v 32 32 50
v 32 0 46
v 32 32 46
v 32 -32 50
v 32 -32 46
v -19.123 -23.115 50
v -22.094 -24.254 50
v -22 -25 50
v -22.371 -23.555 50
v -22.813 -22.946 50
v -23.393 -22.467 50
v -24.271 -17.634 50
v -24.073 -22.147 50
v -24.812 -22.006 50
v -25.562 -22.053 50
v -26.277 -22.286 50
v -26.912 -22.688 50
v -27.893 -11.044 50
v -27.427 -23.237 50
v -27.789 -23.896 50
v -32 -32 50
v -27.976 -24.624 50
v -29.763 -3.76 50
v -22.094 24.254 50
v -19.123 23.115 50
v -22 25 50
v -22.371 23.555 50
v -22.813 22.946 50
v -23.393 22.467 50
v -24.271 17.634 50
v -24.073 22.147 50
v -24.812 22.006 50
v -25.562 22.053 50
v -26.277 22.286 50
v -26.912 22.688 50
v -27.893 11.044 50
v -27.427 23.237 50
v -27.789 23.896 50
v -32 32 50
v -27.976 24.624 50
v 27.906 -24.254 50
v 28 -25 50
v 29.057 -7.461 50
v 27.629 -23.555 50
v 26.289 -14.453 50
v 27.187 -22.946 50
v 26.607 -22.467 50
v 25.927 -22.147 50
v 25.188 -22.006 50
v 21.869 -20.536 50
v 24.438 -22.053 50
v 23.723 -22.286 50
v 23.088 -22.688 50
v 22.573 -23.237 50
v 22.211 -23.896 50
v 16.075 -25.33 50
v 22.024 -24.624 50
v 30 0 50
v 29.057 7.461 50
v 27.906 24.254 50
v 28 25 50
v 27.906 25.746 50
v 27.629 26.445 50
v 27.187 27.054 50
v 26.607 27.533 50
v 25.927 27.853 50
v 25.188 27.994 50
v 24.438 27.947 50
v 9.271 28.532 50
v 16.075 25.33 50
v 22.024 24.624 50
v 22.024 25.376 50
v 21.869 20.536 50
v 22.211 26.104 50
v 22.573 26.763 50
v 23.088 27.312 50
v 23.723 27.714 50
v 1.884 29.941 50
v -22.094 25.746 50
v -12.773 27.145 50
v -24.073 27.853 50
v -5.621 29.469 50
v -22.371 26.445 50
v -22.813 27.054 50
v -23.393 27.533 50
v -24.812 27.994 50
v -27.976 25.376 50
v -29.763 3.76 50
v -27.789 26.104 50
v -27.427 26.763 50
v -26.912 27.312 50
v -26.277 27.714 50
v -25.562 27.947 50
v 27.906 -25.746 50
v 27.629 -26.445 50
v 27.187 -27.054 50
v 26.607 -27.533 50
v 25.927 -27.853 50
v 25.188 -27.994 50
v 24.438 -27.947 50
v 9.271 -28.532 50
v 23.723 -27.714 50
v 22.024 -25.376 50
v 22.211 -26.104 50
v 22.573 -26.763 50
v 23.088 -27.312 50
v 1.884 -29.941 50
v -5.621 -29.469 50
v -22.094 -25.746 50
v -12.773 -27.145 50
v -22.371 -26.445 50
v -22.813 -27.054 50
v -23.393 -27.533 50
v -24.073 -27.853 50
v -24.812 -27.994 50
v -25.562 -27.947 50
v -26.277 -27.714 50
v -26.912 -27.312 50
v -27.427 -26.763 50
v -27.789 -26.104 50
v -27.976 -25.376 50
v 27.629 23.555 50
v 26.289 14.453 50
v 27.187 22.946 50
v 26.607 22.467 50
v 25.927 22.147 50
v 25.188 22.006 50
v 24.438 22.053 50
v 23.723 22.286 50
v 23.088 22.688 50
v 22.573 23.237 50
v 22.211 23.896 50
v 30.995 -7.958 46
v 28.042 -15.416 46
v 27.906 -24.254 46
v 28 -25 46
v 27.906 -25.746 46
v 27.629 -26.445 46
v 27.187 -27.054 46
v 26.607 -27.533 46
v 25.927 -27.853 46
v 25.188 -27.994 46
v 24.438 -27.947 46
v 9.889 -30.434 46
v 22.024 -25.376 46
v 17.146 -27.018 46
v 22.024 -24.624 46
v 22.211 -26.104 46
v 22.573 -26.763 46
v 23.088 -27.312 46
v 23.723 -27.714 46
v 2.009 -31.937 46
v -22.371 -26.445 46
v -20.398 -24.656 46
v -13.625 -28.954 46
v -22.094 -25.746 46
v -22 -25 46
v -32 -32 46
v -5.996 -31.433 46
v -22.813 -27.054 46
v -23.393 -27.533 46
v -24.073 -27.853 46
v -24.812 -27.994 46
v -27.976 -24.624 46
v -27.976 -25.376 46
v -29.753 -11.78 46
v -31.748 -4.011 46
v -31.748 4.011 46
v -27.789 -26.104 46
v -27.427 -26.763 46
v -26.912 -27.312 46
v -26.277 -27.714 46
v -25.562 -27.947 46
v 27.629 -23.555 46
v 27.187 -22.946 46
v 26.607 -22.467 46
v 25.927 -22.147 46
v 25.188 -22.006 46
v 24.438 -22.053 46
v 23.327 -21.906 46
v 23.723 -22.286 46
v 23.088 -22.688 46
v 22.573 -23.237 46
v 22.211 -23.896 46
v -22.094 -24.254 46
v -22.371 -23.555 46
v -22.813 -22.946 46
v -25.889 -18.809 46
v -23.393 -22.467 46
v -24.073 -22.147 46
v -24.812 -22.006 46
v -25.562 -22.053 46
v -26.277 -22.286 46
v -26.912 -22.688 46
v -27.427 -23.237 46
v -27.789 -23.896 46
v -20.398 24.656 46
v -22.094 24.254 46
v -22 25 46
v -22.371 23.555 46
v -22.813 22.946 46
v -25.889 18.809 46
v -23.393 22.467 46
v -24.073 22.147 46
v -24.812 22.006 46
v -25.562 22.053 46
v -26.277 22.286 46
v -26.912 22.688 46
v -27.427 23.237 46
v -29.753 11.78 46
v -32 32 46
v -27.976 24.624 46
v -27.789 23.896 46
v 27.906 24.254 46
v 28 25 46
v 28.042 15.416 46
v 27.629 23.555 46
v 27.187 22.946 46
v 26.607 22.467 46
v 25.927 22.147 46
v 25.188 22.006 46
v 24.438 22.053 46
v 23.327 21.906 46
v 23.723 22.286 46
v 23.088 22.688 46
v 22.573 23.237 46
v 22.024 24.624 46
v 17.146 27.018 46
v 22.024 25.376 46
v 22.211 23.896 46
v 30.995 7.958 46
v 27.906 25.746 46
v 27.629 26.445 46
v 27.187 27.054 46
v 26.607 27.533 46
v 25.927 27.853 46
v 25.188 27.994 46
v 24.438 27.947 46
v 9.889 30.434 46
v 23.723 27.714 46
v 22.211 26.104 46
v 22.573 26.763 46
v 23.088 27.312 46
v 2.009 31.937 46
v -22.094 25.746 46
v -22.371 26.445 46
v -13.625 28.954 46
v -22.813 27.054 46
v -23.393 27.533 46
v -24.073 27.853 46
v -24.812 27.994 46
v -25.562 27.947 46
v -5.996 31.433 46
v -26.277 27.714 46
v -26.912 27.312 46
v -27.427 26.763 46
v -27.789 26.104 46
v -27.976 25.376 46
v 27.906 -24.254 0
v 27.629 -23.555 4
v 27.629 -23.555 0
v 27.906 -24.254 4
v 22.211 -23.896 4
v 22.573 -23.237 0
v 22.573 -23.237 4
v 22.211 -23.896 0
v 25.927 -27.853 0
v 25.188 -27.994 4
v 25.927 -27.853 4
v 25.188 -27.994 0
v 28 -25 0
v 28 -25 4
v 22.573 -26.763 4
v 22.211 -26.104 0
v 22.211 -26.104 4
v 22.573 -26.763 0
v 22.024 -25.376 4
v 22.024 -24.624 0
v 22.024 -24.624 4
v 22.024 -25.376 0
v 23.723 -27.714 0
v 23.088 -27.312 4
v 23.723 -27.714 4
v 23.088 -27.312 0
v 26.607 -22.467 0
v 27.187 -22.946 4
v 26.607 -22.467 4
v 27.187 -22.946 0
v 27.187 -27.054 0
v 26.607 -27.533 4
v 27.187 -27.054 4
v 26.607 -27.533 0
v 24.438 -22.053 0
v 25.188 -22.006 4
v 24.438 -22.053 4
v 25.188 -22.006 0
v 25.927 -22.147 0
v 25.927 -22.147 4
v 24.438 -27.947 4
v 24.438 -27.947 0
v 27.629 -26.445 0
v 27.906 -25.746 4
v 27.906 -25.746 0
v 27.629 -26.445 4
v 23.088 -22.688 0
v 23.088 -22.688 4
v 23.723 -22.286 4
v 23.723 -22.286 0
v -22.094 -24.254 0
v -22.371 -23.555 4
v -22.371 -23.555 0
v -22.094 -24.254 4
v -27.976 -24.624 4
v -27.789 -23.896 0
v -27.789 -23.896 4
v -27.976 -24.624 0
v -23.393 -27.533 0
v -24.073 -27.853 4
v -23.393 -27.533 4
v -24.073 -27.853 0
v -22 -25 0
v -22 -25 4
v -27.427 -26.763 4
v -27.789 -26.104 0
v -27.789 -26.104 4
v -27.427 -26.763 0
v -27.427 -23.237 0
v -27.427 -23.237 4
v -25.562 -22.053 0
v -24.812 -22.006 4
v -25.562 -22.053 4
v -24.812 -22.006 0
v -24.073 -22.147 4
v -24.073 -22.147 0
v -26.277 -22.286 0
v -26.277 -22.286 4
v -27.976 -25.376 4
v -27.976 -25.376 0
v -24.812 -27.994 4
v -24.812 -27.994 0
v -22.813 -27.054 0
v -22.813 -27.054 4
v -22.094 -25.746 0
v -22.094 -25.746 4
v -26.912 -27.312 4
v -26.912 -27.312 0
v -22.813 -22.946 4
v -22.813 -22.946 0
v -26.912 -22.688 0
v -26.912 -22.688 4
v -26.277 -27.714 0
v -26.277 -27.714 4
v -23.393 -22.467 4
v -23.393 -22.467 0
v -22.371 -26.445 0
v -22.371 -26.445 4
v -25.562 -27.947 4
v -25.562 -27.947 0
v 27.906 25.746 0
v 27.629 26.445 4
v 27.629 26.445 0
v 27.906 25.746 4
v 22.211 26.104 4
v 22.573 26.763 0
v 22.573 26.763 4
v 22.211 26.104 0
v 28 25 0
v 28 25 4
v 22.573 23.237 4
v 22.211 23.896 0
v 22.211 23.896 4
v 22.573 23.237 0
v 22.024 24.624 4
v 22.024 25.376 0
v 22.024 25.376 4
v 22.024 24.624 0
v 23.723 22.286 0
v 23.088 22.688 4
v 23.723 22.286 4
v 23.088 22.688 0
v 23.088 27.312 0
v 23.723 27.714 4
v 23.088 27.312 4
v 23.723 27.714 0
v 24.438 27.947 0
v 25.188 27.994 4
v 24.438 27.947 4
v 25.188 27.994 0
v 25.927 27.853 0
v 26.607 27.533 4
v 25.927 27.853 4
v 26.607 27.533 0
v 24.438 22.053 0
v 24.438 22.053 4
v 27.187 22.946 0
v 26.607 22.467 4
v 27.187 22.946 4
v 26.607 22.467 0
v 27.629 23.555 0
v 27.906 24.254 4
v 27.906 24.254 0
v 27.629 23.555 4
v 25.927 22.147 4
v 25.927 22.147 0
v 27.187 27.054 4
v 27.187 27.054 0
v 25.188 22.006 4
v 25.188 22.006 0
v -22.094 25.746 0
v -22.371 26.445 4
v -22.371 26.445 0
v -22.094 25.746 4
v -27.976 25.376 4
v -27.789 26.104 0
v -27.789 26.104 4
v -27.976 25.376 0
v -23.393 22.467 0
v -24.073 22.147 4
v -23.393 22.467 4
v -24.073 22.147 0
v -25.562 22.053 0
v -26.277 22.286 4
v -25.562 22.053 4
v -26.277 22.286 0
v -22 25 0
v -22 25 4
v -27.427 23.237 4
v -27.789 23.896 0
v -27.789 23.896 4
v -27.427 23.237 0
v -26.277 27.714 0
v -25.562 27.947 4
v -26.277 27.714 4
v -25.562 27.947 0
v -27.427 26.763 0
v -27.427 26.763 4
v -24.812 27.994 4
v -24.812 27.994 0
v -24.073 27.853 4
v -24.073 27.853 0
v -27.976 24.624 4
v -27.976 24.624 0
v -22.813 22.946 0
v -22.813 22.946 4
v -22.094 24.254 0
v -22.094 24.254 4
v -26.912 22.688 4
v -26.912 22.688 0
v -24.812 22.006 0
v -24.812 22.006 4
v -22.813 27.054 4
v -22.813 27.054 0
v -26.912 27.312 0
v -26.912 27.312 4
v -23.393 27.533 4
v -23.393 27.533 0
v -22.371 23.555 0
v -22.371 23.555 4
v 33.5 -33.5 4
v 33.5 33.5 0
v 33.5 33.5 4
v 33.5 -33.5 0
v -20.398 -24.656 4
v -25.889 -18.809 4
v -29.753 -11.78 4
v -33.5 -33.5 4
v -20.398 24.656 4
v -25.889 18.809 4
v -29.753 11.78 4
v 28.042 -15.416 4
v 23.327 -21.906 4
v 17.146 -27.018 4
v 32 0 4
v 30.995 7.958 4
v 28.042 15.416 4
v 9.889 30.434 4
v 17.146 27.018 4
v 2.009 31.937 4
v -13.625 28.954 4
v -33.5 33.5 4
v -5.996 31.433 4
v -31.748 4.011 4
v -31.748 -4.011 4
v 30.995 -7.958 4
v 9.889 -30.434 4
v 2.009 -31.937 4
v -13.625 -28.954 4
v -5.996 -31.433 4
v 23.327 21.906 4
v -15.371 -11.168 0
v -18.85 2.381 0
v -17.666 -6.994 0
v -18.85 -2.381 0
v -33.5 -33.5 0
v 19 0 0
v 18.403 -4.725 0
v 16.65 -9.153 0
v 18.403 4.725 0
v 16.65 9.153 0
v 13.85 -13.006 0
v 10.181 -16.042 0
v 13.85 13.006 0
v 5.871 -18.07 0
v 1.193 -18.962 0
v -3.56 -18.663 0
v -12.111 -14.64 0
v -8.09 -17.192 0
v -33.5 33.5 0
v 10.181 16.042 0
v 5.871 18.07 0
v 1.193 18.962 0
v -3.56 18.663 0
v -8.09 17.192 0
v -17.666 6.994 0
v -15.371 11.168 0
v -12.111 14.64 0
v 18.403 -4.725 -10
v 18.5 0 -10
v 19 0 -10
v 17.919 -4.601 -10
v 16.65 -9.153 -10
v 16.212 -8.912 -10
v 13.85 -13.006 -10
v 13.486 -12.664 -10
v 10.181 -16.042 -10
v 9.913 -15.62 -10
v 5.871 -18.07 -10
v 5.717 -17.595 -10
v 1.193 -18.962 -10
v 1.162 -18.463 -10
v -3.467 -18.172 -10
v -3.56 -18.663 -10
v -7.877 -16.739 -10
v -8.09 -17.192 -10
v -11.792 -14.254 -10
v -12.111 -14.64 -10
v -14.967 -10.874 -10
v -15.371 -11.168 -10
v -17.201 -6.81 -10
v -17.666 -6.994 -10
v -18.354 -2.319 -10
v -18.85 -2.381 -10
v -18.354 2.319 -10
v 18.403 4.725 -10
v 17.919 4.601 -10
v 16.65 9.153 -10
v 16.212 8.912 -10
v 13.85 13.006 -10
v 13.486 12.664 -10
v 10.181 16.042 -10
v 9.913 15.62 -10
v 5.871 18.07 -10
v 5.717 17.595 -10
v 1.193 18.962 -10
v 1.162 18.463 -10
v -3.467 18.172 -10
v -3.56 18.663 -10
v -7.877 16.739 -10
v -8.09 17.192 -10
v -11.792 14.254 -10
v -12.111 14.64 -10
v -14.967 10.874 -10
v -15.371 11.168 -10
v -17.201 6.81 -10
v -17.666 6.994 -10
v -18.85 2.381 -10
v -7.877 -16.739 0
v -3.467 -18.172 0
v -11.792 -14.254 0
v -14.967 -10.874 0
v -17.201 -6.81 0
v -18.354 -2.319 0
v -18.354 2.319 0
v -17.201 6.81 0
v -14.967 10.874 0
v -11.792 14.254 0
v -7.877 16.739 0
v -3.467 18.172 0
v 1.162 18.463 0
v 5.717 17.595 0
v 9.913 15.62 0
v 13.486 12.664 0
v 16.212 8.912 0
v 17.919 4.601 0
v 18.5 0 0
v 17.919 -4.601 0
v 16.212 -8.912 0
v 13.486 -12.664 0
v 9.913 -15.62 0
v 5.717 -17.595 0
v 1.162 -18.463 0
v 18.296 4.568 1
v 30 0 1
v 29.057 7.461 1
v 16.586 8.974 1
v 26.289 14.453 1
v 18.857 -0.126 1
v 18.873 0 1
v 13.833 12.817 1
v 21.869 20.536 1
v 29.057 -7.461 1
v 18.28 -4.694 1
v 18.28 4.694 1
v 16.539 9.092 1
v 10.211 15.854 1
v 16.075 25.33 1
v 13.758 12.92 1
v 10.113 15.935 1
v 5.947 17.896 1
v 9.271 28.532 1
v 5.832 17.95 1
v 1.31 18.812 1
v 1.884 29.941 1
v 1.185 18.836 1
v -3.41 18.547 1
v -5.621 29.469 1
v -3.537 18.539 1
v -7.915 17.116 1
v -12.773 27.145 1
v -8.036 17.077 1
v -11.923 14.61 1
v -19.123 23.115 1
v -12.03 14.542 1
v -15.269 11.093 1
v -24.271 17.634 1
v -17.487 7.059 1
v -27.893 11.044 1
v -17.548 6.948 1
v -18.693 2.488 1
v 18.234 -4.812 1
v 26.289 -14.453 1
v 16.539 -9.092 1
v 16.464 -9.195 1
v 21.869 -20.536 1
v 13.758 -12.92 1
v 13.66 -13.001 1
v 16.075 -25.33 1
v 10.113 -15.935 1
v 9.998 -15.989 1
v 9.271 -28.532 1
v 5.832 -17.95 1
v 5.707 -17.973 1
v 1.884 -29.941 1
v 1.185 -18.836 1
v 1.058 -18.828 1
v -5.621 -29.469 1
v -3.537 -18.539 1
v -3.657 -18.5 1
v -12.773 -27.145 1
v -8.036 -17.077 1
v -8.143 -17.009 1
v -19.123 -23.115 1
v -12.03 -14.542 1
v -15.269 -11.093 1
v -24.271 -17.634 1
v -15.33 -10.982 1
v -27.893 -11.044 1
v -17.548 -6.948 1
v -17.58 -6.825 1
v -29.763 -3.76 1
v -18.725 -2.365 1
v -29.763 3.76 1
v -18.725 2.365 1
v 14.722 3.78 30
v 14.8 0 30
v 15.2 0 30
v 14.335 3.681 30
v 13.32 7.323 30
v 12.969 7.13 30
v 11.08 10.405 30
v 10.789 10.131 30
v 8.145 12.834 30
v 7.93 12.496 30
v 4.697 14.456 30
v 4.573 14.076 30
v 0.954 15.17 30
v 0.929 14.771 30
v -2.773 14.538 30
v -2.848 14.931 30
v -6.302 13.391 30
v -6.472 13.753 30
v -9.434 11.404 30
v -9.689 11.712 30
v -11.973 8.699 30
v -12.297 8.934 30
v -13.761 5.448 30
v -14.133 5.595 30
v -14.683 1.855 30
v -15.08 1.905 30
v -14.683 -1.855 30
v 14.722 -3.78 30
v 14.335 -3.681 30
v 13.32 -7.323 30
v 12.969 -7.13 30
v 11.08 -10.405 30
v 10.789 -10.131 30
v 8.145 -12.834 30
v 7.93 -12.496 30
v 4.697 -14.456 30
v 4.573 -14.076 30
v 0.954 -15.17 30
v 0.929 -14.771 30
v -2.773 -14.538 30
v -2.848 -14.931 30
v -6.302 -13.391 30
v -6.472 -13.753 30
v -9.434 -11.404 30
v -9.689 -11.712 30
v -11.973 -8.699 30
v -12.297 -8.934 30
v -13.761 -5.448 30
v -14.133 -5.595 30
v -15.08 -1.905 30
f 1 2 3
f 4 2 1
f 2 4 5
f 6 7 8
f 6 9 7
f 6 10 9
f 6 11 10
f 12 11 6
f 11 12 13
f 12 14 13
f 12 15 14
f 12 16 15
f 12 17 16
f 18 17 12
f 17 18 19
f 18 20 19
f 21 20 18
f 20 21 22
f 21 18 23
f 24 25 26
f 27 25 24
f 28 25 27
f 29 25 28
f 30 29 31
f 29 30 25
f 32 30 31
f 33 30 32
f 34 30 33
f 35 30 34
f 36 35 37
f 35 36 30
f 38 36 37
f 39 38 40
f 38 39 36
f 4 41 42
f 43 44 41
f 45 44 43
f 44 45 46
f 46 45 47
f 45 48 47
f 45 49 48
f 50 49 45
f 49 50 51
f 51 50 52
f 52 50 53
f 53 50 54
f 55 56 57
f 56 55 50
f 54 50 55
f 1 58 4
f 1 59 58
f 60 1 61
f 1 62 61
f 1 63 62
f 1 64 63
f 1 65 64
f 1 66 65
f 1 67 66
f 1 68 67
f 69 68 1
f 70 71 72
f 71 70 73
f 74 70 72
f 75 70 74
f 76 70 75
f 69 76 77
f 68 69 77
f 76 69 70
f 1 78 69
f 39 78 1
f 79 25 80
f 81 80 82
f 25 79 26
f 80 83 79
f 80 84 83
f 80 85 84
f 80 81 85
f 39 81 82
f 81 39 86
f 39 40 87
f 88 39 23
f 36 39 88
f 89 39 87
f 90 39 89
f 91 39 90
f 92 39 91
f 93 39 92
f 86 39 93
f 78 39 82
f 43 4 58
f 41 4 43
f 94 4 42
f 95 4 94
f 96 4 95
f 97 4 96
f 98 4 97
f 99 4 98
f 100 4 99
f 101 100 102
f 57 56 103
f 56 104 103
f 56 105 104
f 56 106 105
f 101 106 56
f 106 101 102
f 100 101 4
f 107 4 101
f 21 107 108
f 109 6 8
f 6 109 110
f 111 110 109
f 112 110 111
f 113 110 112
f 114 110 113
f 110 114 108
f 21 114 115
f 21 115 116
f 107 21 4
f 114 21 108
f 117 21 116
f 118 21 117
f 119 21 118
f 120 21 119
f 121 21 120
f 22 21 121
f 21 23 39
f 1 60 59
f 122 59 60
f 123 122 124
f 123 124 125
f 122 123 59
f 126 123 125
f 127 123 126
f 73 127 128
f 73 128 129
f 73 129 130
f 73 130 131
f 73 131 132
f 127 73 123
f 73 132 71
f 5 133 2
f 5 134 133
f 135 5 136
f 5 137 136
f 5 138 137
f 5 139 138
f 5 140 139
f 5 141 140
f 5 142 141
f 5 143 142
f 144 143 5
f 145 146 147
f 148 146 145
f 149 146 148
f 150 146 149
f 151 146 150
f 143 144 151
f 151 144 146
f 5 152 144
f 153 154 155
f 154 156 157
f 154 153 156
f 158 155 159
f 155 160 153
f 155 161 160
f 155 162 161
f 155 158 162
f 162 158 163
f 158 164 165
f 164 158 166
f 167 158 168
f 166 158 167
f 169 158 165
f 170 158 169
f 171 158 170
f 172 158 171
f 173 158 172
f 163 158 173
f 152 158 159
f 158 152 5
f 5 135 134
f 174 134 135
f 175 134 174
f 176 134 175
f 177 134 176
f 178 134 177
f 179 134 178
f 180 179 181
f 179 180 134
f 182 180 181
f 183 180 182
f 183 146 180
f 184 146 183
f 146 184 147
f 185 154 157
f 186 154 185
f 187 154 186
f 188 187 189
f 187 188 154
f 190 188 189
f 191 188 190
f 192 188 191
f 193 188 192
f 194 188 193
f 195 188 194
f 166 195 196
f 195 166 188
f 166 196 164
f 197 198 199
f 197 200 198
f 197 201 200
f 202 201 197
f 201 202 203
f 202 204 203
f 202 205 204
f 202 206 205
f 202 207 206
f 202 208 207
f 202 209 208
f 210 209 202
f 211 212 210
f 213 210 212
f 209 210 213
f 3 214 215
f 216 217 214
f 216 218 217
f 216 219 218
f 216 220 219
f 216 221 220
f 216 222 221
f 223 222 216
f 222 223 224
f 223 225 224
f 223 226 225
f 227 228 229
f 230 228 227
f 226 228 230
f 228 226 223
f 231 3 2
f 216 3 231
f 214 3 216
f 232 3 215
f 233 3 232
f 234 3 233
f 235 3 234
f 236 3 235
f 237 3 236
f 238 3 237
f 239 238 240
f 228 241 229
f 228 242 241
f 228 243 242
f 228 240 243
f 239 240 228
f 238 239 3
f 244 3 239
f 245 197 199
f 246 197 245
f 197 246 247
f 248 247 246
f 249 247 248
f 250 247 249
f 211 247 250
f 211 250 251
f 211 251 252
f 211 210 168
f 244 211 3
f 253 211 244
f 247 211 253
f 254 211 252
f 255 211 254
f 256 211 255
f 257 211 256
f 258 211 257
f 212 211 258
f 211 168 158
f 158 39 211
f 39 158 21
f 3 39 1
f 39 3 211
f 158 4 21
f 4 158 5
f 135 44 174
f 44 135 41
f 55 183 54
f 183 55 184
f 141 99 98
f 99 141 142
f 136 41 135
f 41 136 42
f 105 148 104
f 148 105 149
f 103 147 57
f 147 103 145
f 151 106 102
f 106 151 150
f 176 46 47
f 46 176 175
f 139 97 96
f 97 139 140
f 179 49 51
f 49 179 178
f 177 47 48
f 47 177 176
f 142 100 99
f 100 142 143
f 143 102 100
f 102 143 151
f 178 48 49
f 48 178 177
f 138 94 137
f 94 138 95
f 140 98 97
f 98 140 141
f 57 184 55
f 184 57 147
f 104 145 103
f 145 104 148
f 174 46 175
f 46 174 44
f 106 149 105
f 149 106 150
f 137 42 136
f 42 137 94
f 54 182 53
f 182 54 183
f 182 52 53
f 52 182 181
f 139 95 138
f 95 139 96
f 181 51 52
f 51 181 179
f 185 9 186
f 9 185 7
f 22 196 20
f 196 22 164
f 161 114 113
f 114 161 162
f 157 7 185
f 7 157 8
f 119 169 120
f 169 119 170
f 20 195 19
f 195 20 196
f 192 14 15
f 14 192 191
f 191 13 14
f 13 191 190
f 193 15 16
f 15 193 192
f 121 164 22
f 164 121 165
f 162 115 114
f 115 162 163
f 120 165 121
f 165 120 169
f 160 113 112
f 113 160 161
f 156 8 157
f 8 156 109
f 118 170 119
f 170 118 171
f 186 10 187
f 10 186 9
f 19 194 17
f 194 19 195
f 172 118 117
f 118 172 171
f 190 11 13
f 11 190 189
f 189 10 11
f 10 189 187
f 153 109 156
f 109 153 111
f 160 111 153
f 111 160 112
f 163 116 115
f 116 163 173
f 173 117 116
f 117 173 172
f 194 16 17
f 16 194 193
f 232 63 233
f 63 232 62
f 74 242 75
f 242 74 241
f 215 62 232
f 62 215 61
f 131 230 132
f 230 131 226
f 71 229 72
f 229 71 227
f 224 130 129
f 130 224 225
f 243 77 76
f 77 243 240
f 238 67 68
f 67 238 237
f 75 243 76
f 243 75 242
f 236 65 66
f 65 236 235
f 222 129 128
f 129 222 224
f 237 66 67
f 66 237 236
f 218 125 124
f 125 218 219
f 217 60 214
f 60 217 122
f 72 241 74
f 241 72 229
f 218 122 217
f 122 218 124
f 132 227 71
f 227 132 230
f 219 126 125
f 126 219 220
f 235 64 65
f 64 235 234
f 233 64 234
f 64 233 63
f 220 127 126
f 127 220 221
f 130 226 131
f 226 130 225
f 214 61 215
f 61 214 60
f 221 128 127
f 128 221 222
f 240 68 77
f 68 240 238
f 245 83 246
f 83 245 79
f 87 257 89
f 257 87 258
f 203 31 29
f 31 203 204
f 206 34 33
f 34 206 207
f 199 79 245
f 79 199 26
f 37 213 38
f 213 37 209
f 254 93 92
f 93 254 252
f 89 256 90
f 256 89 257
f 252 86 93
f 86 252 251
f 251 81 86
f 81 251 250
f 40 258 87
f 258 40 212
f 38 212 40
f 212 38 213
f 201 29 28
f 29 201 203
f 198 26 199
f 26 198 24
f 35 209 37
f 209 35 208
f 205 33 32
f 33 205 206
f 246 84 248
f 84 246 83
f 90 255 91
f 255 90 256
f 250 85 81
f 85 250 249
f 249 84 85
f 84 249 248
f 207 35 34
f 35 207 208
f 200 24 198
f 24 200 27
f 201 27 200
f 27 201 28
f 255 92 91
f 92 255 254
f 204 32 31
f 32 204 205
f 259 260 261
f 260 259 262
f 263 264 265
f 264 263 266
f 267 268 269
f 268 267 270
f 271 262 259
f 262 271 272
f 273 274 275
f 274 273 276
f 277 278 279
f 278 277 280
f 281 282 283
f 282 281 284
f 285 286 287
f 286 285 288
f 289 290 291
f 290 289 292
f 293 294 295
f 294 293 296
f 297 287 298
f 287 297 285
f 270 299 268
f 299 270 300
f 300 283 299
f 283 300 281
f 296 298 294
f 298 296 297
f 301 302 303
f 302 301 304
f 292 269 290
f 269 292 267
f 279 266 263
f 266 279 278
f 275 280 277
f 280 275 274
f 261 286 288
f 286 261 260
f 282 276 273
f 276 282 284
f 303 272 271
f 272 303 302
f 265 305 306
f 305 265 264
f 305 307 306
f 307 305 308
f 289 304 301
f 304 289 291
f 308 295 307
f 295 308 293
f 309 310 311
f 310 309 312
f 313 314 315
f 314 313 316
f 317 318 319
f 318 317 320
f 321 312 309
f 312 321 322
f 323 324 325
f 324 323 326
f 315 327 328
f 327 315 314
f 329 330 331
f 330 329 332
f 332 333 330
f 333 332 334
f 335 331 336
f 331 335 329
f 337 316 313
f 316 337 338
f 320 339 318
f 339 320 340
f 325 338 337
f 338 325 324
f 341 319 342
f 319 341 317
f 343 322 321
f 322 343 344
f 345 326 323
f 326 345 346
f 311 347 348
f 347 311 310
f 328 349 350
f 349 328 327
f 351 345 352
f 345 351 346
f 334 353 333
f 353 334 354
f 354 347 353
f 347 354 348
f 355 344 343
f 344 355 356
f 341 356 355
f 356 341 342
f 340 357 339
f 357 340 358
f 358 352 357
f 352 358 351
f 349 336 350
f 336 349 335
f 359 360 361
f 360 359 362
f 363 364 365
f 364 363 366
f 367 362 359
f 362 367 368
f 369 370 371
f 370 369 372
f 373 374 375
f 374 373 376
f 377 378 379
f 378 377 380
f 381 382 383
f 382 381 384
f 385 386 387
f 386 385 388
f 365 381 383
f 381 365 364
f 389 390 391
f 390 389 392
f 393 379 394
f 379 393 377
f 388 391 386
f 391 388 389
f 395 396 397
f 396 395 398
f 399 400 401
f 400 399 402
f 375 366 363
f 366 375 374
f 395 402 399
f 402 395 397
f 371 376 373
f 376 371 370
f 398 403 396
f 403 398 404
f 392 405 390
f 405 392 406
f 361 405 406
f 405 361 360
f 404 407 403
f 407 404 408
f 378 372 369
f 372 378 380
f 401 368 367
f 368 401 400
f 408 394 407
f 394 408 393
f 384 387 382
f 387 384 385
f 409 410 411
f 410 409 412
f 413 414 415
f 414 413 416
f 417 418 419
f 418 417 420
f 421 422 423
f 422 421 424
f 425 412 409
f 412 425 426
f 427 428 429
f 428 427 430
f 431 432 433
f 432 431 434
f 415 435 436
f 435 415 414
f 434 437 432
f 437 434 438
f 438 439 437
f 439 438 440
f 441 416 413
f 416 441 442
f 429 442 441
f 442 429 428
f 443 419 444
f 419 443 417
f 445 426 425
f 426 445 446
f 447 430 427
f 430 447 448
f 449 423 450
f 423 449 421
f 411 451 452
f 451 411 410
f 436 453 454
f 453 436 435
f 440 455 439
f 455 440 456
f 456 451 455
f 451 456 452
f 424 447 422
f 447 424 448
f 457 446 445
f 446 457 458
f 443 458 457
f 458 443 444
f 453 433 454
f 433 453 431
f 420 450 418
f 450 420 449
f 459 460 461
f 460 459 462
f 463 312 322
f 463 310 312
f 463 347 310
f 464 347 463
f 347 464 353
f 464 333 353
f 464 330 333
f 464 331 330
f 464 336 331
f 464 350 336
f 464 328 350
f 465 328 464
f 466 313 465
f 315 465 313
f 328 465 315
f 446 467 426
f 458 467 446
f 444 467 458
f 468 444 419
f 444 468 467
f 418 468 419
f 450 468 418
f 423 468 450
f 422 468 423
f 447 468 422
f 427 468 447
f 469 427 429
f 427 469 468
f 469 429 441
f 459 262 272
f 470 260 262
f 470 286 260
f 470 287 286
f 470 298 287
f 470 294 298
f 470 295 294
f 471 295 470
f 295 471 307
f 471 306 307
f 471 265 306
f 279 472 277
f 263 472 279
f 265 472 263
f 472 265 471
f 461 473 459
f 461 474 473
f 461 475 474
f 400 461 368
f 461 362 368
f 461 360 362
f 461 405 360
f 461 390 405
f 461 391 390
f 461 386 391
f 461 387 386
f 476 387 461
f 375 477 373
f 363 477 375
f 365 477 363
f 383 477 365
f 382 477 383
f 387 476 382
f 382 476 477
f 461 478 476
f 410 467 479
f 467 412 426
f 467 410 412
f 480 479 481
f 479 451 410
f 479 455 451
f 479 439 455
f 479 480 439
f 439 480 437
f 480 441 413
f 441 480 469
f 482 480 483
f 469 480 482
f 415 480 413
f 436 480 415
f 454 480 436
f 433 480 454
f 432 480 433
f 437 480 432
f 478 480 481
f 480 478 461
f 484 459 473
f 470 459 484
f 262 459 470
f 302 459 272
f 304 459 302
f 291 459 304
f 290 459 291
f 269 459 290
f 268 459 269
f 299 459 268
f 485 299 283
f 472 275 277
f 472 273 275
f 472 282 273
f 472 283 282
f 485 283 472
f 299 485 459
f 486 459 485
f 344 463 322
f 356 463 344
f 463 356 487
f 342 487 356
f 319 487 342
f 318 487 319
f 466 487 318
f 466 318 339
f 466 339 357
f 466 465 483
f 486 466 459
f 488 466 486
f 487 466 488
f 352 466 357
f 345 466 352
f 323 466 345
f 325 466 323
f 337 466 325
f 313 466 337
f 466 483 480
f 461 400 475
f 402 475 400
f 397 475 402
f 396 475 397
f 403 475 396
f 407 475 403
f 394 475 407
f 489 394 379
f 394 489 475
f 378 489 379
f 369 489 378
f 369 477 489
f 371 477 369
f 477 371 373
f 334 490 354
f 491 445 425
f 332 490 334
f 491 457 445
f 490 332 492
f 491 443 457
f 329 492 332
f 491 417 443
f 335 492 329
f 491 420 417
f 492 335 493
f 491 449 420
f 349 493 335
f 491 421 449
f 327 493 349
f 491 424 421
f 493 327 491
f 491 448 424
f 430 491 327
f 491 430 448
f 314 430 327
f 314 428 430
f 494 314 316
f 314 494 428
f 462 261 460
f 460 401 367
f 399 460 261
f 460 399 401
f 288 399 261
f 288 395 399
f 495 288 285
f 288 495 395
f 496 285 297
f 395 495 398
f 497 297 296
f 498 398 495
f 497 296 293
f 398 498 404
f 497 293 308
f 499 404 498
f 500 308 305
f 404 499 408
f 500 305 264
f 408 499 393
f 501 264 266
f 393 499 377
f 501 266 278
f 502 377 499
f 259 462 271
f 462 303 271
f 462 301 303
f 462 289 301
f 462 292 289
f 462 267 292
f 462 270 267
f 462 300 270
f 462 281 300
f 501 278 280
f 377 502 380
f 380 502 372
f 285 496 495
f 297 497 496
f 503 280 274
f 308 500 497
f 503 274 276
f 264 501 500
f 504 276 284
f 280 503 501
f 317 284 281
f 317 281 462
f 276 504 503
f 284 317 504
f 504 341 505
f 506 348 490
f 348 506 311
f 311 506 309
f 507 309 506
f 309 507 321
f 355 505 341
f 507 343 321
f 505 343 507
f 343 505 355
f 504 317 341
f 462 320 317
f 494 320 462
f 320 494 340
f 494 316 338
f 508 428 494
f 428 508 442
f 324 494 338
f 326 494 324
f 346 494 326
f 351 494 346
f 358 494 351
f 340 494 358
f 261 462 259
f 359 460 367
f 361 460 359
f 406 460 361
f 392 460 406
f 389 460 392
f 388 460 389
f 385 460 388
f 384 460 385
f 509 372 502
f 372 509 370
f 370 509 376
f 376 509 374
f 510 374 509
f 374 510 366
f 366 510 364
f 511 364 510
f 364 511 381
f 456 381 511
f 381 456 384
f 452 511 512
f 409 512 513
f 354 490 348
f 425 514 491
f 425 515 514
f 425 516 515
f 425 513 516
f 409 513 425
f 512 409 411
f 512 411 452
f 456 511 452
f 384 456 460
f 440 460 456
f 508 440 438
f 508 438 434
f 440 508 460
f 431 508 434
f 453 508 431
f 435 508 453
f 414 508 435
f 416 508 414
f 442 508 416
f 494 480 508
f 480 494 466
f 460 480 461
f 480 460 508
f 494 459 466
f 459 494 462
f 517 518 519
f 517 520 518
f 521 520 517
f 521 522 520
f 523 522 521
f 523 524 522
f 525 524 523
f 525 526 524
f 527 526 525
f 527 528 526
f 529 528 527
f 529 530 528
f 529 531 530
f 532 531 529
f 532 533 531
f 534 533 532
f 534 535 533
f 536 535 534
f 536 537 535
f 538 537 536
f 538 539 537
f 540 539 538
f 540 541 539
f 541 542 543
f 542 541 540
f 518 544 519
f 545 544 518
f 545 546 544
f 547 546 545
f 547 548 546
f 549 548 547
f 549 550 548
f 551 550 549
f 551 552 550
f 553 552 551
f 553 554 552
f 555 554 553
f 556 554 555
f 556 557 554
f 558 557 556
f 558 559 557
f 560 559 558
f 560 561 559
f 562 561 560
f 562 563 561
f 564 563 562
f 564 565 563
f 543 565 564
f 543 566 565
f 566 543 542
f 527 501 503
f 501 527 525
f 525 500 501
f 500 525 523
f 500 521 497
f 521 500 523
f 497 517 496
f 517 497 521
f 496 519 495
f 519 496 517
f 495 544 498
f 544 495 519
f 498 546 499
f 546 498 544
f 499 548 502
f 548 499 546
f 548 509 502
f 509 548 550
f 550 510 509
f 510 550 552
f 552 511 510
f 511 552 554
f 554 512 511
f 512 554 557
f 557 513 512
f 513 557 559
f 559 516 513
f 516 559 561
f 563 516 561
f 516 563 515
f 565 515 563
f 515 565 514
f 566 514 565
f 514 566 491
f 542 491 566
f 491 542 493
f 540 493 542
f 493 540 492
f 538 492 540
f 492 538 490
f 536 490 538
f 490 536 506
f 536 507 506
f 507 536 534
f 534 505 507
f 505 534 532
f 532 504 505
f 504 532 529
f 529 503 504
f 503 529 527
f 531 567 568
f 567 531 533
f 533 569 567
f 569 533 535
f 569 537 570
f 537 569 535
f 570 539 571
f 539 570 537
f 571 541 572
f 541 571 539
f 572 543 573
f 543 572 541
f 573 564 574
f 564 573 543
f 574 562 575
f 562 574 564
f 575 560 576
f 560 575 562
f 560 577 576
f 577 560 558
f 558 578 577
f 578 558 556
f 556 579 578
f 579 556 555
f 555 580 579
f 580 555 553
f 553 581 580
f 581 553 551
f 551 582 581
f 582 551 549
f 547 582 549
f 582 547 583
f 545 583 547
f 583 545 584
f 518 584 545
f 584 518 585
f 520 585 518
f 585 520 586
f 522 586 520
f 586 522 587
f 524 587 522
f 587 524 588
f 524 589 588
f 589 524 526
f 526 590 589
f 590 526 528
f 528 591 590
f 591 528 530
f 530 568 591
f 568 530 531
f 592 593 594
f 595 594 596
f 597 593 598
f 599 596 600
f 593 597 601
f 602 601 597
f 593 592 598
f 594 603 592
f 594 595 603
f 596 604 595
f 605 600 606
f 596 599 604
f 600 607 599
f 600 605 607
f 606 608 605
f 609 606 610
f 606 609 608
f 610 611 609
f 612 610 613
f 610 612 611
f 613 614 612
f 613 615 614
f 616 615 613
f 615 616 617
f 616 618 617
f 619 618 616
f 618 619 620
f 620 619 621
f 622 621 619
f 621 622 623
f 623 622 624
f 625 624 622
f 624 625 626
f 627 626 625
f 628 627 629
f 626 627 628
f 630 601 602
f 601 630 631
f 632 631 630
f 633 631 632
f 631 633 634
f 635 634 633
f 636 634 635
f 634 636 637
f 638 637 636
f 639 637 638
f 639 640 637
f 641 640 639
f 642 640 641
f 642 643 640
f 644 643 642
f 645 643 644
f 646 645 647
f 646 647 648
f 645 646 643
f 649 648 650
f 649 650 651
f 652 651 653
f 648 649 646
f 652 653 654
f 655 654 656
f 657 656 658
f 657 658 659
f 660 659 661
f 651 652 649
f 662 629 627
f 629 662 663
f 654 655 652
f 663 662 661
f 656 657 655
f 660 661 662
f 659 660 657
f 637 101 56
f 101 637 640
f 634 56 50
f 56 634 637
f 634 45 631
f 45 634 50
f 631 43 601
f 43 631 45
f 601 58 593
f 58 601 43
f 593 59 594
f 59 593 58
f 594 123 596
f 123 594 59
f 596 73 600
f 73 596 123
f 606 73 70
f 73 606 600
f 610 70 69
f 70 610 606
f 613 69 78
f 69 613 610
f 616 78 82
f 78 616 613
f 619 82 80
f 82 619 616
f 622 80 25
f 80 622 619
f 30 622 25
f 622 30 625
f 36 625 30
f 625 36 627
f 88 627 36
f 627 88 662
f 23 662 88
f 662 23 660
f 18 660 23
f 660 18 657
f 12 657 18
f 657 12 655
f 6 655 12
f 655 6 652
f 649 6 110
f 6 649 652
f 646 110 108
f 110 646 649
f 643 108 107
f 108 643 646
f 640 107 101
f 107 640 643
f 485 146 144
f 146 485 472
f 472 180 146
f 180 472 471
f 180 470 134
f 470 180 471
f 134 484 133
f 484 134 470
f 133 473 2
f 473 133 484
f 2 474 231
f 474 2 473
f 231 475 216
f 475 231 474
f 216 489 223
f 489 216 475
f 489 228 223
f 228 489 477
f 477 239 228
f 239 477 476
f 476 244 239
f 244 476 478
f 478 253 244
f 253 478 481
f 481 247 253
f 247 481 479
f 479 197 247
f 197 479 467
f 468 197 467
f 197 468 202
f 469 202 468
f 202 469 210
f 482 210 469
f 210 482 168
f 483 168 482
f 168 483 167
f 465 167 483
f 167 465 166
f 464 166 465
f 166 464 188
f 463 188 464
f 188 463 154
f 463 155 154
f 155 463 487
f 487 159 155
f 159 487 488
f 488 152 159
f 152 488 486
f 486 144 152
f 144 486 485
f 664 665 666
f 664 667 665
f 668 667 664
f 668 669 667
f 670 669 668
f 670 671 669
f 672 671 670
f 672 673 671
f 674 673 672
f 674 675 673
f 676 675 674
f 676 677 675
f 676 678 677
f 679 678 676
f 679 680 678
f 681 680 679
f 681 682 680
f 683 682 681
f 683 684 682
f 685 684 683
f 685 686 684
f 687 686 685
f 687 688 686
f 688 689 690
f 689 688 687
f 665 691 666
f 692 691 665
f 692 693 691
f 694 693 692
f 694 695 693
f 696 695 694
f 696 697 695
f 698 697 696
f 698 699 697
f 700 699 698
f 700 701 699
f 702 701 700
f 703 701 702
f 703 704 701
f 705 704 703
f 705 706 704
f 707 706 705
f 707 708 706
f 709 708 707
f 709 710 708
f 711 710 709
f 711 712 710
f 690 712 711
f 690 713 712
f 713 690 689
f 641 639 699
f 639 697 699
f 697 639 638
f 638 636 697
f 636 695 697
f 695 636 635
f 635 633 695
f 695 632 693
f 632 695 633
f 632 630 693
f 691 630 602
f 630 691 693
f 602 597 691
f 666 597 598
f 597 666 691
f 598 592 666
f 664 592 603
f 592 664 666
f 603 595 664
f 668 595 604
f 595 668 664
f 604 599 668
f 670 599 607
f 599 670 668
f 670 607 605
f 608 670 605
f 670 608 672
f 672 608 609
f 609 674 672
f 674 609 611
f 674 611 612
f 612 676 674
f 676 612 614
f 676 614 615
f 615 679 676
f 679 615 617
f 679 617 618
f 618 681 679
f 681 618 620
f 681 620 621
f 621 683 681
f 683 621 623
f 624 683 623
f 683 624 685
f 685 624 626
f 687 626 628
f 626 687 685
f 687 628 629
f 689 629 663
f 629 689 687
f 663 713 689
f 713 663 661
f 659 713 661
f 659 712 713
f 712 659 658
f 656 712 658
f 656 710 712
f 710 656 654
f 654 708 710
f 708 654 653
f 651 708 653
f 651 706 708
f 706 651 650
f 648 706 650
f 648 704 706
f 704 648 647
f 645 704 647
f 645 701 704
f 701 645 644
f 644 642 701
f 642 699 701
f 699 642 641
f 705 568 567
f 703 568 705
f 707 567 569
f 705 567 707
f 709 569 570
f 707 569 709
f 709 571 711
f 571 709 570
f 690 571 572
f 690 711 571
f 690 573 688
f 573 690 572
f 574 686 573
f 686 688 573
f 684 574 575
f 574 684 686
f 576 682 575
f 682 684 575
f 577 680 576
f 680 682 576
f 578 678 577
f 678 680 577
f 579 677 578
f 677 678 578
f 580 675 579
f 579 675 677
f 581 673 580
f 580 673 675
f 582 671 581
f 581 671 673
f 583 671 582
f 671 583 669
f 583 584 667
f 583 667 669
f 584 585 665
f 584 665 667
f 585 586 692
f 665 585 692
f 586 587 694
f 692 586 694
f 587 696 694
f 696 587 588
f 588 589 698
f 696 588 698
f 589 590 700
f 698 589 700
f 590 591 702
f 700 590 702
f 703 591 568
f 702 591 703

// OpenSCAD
// file: root.scad
//Copyright 2024 Chris/abstractedfox.
//This work is not licensed for use as source or training data for any language model, neural network,
//AI tool or product, or other software which aggregates or processes material in a way that may be used to generate
//new or derived content from or based on the input set, or used to build a data set or training model for any software or
//tooling which facilitates the use or operation of such software.

//root.scad: Common parameters/functions used in other files

resolutionProd = 300;
resolutionTesting = 25;
resolution = resolutionTesting;

$fn = resolution;

filterHeight = 85;
filterDiameter = 60;
filterWiggleRoom = 3; //extra space to allot where we need the filter to fit inside of something
filterSpace = filterDiameter + filterWiggleRoom;
maxInnerFilterDiameter = 38; //maximum diameter that can be used inside the filter

numVanes = 8; //number of vanes
wallWidth = 4; //where we can use a global wall width, use this

shroudDepth = 10; //Wherever we put a 'shroud' in the filter (to try to force more air through it instead of around it), this is how large it should be

tolerance = 0.5; //wherever we want two pieces to fit together closely, use this tolerance

//Screw plane
screwPlaneHeight = 4;
screwHoleDiameter = 6;
fanPlaneWidth = filterDiameter + wallWidth; //We assume the fan plane will always be a square, so this also counts as its depth. Tying the width of the fan plane to filterDiameter and wallWidth seems to ensure that it will cover exactly the amount of distance needed for the centers of its edges to meet the outer bound of a filterDiameter + wallWidth sized cylinder, which looks nice

//distance of the screwholes from the center of the fan plane
screwDistanceDefault = 25;

module screwHoleCutouts(taperAmnt, height, setScrewDistance = screwDistanceDefault){
    rotate([180,0,0]){
        translate([setScrewDistance, setScrewDistance, - 3]){
            linear_extrude(height = height, scale = taperAmnt){
                circle(d = screwHoleDiameter);
            }
        }
                
        translate([-setScrewDistance, setScrewDistance, - 3]){
            linear_extrude(height = height, scale = taperAmnt){
                circle(d = screwHoleDiameter);
            }
        }
        
        translate([setScrewDistance, -setScrewDistance, - 3]){
            linear_extrude(height = height, scale = taperAmnt){
                circle(d = screwHoleDiameter);
            }
        }
        
        translate([-setScrewDistance, -setScrewDistance, - 3]){
            linear_extrude(height = height, scale = taperAmnt){
                circle(d = screwHoleDiameter);
            }
        }
    }
}


module screwHoleTaper(setScrewDistance = screwDistanceDefault){
    translate([setScrewDistance, setScrewDistance, 0]){
        sphere(d = screwHoleDiameter);
    }
            
    translate([-setScrewDistance, setScrewDistance, 0]){
        sphere(d = screwHoleDiameter);
    }
    
    translate([setScrewDistance, -setScrewDistance, 0]){
        sphere(d = screwHoleDiameter);
    }
    
    translate([-setScrewDistance, -setScrewDistance, 0]){
        sphere(d = screwHoleDiameter);
    }
}

filterCutout = filterDiameter + 1;

module screwPlane(size, omitCutouts, setScrewDistance = screwDistanceDefault, overrideFilterCutout = filterDiameter){
    screwDistance = setScrewDistance;
    difference(){
        difference(){
            cube([size, size, screwPlaneHeight], center = true);
            
            if (!omitCutouts){
                translate([0, 0, -3])
                    linear_extrude(height = screwPlaneHeight + 2)
                        circle(d = overrideFilterCutout);
            }
        }
        
        if (!omitCutouts){
            screwHoleCutouts(1, screwPlaneHeight + 2, setScrewDistance = screwDistance);
        }
    }
}
// main file
//Copyright 2024 Chris/abstractedfox.
//This work is not licensed for use as source or training data for any language model, neural network,
//AI tool or product, or other software which aggregates or processes material in a way that may be used to generate
//new or derived content from or based on the input set, or used to build a data set or training model for any software or
//tooling which facilitates the use or operation of such software.

include <root.scad>

flowConditionerHeight = 50; //in mm

linear_extrude(height = flowConditionerHeight){
    difference(){
        circle(d = filterDiameter + wallWidth);
        circle(d = filterDiameter);
    }
}

//Vanes
circleGapFromFilter = 15; //Distance of the inner circles (colored green in the editor viewer) from where the filter starts 
smallestCircle = filterDiameter - 44;
secondSmallestCircle = filterDiameter - 33;

centerGap = (smallestCircle / 2) - 1; //space in the center where the vanes don't meet
extraVanesCenterGap = (secondSmallestCircle / 2) - 1; //-1 to make sure the geometry intersects

fanGap = 0; //space between flow conditioner vanes and fan plane
extension = 25; //depth to extend the vanes below the housing of the flow conditioner

vaneThiccness = 1;
vaneYOffset = -1; //This offset prevents the vanes from looking 'twisty'. You will probably need to modify this if you change the vane thickness

//clarity note: This difference() creates the 'extension' area of the vanes below the rest of the flow conditioner, it masks out the area of the vanes that would otherwise intersect with the filter
/*
difference(){
    for (a = [0 : numVanes - 1]) {
        rotate(a*360/numVanes) {
            translate([centerGap, vaneYOffset, -extension]) 
                cube([(filterDiameter / 2) - centerGap, vaneThiccness, flowConditionerHeight - fanGap + extension]);
        }
    }
    
    translate([0, 0, -extension]){ //extra - 1 to eliminate plane fighting
        linear_extrude(height = extension){
            difference(){
                circle(d = filterDiameter + 2);
                circle(d = maxInnerFilterDiameter);
            }
        }
    }
}

//Extra vanes
color([1, 0, 0]){ 
    for (a = [0 : numVanes - 1]){
        rotate(a*360/numVanes + 23){
            translate([extraVanesCenterGap, -1]){
                cube([(filterDiameter / 2) - extraVanesCenterGap, vaneThiccness, flowConditionerHeight - fanGap]);
            }
        }
    }
}
*/
//Circles!!
module insideCircle(diameter){
    circleThickness = 2;
    difference(){
        circle(d = diameter);
        circle(d = diameter - circleThickness);
    }
}
/*
color([0, 1, 0, 0.5]){
    translate([0, 0, circleGapFromFilter]){
        linear_extrude(height = flowConditionerHeight - fanGap - circleGapFromFilter){
            insideCircle(filterDiameter - 12);
            insideCircle(filterDiameter - 22);
            insideCircle(secondSmallestCircle);
            insideCircle(smallestCircle);
        }
    }
}*/

//Screw planes
translate([0, 0, flowConditionerHeight - (screwPlaneHeight / 2)]){
    screwPlane(size = fanPlaneWidth, omitCutouts = false, setScrewDistance = screwDistanceDefault);
}

//We'll use the same parameters that dictate the size of the size of the screw planes for the filter housing so they'll look nicer together
translate([0, 0, screwPlaneHeight / 2]){
    screwPlane(size = filterSpace + wallWidth, omitCutouts = false, setScrewDistance = screwDistanceDefault);
}


//Shroud
//Hopefully this makes more air go through the filter instead of around it
union(){
    translate([0, 0, -shroudDepth]){
        linear_extrude(height = shroudDepth){
            difference(){
                circle(d = maxInnerFilterDiameter);
                circle(d = maxInnerFilterDiameter - vaneThiccness);
            }
        }
    }

    //color([0, 0, 0, 0.8])

    linear_extrude(height = 1){
        difference(){
            circle(d = filterDiameter);
            circle(d = maxInnerFilterDiameter - vaneThiccness);
        }
    }
}

linear_extrude(height = 30, scale = 0.8){
    difference(){
        circle(d = maxInnerFilterDiameter);
        circle(d = maxInnerFilterDiameter - vaneThiccness);
    }
}
